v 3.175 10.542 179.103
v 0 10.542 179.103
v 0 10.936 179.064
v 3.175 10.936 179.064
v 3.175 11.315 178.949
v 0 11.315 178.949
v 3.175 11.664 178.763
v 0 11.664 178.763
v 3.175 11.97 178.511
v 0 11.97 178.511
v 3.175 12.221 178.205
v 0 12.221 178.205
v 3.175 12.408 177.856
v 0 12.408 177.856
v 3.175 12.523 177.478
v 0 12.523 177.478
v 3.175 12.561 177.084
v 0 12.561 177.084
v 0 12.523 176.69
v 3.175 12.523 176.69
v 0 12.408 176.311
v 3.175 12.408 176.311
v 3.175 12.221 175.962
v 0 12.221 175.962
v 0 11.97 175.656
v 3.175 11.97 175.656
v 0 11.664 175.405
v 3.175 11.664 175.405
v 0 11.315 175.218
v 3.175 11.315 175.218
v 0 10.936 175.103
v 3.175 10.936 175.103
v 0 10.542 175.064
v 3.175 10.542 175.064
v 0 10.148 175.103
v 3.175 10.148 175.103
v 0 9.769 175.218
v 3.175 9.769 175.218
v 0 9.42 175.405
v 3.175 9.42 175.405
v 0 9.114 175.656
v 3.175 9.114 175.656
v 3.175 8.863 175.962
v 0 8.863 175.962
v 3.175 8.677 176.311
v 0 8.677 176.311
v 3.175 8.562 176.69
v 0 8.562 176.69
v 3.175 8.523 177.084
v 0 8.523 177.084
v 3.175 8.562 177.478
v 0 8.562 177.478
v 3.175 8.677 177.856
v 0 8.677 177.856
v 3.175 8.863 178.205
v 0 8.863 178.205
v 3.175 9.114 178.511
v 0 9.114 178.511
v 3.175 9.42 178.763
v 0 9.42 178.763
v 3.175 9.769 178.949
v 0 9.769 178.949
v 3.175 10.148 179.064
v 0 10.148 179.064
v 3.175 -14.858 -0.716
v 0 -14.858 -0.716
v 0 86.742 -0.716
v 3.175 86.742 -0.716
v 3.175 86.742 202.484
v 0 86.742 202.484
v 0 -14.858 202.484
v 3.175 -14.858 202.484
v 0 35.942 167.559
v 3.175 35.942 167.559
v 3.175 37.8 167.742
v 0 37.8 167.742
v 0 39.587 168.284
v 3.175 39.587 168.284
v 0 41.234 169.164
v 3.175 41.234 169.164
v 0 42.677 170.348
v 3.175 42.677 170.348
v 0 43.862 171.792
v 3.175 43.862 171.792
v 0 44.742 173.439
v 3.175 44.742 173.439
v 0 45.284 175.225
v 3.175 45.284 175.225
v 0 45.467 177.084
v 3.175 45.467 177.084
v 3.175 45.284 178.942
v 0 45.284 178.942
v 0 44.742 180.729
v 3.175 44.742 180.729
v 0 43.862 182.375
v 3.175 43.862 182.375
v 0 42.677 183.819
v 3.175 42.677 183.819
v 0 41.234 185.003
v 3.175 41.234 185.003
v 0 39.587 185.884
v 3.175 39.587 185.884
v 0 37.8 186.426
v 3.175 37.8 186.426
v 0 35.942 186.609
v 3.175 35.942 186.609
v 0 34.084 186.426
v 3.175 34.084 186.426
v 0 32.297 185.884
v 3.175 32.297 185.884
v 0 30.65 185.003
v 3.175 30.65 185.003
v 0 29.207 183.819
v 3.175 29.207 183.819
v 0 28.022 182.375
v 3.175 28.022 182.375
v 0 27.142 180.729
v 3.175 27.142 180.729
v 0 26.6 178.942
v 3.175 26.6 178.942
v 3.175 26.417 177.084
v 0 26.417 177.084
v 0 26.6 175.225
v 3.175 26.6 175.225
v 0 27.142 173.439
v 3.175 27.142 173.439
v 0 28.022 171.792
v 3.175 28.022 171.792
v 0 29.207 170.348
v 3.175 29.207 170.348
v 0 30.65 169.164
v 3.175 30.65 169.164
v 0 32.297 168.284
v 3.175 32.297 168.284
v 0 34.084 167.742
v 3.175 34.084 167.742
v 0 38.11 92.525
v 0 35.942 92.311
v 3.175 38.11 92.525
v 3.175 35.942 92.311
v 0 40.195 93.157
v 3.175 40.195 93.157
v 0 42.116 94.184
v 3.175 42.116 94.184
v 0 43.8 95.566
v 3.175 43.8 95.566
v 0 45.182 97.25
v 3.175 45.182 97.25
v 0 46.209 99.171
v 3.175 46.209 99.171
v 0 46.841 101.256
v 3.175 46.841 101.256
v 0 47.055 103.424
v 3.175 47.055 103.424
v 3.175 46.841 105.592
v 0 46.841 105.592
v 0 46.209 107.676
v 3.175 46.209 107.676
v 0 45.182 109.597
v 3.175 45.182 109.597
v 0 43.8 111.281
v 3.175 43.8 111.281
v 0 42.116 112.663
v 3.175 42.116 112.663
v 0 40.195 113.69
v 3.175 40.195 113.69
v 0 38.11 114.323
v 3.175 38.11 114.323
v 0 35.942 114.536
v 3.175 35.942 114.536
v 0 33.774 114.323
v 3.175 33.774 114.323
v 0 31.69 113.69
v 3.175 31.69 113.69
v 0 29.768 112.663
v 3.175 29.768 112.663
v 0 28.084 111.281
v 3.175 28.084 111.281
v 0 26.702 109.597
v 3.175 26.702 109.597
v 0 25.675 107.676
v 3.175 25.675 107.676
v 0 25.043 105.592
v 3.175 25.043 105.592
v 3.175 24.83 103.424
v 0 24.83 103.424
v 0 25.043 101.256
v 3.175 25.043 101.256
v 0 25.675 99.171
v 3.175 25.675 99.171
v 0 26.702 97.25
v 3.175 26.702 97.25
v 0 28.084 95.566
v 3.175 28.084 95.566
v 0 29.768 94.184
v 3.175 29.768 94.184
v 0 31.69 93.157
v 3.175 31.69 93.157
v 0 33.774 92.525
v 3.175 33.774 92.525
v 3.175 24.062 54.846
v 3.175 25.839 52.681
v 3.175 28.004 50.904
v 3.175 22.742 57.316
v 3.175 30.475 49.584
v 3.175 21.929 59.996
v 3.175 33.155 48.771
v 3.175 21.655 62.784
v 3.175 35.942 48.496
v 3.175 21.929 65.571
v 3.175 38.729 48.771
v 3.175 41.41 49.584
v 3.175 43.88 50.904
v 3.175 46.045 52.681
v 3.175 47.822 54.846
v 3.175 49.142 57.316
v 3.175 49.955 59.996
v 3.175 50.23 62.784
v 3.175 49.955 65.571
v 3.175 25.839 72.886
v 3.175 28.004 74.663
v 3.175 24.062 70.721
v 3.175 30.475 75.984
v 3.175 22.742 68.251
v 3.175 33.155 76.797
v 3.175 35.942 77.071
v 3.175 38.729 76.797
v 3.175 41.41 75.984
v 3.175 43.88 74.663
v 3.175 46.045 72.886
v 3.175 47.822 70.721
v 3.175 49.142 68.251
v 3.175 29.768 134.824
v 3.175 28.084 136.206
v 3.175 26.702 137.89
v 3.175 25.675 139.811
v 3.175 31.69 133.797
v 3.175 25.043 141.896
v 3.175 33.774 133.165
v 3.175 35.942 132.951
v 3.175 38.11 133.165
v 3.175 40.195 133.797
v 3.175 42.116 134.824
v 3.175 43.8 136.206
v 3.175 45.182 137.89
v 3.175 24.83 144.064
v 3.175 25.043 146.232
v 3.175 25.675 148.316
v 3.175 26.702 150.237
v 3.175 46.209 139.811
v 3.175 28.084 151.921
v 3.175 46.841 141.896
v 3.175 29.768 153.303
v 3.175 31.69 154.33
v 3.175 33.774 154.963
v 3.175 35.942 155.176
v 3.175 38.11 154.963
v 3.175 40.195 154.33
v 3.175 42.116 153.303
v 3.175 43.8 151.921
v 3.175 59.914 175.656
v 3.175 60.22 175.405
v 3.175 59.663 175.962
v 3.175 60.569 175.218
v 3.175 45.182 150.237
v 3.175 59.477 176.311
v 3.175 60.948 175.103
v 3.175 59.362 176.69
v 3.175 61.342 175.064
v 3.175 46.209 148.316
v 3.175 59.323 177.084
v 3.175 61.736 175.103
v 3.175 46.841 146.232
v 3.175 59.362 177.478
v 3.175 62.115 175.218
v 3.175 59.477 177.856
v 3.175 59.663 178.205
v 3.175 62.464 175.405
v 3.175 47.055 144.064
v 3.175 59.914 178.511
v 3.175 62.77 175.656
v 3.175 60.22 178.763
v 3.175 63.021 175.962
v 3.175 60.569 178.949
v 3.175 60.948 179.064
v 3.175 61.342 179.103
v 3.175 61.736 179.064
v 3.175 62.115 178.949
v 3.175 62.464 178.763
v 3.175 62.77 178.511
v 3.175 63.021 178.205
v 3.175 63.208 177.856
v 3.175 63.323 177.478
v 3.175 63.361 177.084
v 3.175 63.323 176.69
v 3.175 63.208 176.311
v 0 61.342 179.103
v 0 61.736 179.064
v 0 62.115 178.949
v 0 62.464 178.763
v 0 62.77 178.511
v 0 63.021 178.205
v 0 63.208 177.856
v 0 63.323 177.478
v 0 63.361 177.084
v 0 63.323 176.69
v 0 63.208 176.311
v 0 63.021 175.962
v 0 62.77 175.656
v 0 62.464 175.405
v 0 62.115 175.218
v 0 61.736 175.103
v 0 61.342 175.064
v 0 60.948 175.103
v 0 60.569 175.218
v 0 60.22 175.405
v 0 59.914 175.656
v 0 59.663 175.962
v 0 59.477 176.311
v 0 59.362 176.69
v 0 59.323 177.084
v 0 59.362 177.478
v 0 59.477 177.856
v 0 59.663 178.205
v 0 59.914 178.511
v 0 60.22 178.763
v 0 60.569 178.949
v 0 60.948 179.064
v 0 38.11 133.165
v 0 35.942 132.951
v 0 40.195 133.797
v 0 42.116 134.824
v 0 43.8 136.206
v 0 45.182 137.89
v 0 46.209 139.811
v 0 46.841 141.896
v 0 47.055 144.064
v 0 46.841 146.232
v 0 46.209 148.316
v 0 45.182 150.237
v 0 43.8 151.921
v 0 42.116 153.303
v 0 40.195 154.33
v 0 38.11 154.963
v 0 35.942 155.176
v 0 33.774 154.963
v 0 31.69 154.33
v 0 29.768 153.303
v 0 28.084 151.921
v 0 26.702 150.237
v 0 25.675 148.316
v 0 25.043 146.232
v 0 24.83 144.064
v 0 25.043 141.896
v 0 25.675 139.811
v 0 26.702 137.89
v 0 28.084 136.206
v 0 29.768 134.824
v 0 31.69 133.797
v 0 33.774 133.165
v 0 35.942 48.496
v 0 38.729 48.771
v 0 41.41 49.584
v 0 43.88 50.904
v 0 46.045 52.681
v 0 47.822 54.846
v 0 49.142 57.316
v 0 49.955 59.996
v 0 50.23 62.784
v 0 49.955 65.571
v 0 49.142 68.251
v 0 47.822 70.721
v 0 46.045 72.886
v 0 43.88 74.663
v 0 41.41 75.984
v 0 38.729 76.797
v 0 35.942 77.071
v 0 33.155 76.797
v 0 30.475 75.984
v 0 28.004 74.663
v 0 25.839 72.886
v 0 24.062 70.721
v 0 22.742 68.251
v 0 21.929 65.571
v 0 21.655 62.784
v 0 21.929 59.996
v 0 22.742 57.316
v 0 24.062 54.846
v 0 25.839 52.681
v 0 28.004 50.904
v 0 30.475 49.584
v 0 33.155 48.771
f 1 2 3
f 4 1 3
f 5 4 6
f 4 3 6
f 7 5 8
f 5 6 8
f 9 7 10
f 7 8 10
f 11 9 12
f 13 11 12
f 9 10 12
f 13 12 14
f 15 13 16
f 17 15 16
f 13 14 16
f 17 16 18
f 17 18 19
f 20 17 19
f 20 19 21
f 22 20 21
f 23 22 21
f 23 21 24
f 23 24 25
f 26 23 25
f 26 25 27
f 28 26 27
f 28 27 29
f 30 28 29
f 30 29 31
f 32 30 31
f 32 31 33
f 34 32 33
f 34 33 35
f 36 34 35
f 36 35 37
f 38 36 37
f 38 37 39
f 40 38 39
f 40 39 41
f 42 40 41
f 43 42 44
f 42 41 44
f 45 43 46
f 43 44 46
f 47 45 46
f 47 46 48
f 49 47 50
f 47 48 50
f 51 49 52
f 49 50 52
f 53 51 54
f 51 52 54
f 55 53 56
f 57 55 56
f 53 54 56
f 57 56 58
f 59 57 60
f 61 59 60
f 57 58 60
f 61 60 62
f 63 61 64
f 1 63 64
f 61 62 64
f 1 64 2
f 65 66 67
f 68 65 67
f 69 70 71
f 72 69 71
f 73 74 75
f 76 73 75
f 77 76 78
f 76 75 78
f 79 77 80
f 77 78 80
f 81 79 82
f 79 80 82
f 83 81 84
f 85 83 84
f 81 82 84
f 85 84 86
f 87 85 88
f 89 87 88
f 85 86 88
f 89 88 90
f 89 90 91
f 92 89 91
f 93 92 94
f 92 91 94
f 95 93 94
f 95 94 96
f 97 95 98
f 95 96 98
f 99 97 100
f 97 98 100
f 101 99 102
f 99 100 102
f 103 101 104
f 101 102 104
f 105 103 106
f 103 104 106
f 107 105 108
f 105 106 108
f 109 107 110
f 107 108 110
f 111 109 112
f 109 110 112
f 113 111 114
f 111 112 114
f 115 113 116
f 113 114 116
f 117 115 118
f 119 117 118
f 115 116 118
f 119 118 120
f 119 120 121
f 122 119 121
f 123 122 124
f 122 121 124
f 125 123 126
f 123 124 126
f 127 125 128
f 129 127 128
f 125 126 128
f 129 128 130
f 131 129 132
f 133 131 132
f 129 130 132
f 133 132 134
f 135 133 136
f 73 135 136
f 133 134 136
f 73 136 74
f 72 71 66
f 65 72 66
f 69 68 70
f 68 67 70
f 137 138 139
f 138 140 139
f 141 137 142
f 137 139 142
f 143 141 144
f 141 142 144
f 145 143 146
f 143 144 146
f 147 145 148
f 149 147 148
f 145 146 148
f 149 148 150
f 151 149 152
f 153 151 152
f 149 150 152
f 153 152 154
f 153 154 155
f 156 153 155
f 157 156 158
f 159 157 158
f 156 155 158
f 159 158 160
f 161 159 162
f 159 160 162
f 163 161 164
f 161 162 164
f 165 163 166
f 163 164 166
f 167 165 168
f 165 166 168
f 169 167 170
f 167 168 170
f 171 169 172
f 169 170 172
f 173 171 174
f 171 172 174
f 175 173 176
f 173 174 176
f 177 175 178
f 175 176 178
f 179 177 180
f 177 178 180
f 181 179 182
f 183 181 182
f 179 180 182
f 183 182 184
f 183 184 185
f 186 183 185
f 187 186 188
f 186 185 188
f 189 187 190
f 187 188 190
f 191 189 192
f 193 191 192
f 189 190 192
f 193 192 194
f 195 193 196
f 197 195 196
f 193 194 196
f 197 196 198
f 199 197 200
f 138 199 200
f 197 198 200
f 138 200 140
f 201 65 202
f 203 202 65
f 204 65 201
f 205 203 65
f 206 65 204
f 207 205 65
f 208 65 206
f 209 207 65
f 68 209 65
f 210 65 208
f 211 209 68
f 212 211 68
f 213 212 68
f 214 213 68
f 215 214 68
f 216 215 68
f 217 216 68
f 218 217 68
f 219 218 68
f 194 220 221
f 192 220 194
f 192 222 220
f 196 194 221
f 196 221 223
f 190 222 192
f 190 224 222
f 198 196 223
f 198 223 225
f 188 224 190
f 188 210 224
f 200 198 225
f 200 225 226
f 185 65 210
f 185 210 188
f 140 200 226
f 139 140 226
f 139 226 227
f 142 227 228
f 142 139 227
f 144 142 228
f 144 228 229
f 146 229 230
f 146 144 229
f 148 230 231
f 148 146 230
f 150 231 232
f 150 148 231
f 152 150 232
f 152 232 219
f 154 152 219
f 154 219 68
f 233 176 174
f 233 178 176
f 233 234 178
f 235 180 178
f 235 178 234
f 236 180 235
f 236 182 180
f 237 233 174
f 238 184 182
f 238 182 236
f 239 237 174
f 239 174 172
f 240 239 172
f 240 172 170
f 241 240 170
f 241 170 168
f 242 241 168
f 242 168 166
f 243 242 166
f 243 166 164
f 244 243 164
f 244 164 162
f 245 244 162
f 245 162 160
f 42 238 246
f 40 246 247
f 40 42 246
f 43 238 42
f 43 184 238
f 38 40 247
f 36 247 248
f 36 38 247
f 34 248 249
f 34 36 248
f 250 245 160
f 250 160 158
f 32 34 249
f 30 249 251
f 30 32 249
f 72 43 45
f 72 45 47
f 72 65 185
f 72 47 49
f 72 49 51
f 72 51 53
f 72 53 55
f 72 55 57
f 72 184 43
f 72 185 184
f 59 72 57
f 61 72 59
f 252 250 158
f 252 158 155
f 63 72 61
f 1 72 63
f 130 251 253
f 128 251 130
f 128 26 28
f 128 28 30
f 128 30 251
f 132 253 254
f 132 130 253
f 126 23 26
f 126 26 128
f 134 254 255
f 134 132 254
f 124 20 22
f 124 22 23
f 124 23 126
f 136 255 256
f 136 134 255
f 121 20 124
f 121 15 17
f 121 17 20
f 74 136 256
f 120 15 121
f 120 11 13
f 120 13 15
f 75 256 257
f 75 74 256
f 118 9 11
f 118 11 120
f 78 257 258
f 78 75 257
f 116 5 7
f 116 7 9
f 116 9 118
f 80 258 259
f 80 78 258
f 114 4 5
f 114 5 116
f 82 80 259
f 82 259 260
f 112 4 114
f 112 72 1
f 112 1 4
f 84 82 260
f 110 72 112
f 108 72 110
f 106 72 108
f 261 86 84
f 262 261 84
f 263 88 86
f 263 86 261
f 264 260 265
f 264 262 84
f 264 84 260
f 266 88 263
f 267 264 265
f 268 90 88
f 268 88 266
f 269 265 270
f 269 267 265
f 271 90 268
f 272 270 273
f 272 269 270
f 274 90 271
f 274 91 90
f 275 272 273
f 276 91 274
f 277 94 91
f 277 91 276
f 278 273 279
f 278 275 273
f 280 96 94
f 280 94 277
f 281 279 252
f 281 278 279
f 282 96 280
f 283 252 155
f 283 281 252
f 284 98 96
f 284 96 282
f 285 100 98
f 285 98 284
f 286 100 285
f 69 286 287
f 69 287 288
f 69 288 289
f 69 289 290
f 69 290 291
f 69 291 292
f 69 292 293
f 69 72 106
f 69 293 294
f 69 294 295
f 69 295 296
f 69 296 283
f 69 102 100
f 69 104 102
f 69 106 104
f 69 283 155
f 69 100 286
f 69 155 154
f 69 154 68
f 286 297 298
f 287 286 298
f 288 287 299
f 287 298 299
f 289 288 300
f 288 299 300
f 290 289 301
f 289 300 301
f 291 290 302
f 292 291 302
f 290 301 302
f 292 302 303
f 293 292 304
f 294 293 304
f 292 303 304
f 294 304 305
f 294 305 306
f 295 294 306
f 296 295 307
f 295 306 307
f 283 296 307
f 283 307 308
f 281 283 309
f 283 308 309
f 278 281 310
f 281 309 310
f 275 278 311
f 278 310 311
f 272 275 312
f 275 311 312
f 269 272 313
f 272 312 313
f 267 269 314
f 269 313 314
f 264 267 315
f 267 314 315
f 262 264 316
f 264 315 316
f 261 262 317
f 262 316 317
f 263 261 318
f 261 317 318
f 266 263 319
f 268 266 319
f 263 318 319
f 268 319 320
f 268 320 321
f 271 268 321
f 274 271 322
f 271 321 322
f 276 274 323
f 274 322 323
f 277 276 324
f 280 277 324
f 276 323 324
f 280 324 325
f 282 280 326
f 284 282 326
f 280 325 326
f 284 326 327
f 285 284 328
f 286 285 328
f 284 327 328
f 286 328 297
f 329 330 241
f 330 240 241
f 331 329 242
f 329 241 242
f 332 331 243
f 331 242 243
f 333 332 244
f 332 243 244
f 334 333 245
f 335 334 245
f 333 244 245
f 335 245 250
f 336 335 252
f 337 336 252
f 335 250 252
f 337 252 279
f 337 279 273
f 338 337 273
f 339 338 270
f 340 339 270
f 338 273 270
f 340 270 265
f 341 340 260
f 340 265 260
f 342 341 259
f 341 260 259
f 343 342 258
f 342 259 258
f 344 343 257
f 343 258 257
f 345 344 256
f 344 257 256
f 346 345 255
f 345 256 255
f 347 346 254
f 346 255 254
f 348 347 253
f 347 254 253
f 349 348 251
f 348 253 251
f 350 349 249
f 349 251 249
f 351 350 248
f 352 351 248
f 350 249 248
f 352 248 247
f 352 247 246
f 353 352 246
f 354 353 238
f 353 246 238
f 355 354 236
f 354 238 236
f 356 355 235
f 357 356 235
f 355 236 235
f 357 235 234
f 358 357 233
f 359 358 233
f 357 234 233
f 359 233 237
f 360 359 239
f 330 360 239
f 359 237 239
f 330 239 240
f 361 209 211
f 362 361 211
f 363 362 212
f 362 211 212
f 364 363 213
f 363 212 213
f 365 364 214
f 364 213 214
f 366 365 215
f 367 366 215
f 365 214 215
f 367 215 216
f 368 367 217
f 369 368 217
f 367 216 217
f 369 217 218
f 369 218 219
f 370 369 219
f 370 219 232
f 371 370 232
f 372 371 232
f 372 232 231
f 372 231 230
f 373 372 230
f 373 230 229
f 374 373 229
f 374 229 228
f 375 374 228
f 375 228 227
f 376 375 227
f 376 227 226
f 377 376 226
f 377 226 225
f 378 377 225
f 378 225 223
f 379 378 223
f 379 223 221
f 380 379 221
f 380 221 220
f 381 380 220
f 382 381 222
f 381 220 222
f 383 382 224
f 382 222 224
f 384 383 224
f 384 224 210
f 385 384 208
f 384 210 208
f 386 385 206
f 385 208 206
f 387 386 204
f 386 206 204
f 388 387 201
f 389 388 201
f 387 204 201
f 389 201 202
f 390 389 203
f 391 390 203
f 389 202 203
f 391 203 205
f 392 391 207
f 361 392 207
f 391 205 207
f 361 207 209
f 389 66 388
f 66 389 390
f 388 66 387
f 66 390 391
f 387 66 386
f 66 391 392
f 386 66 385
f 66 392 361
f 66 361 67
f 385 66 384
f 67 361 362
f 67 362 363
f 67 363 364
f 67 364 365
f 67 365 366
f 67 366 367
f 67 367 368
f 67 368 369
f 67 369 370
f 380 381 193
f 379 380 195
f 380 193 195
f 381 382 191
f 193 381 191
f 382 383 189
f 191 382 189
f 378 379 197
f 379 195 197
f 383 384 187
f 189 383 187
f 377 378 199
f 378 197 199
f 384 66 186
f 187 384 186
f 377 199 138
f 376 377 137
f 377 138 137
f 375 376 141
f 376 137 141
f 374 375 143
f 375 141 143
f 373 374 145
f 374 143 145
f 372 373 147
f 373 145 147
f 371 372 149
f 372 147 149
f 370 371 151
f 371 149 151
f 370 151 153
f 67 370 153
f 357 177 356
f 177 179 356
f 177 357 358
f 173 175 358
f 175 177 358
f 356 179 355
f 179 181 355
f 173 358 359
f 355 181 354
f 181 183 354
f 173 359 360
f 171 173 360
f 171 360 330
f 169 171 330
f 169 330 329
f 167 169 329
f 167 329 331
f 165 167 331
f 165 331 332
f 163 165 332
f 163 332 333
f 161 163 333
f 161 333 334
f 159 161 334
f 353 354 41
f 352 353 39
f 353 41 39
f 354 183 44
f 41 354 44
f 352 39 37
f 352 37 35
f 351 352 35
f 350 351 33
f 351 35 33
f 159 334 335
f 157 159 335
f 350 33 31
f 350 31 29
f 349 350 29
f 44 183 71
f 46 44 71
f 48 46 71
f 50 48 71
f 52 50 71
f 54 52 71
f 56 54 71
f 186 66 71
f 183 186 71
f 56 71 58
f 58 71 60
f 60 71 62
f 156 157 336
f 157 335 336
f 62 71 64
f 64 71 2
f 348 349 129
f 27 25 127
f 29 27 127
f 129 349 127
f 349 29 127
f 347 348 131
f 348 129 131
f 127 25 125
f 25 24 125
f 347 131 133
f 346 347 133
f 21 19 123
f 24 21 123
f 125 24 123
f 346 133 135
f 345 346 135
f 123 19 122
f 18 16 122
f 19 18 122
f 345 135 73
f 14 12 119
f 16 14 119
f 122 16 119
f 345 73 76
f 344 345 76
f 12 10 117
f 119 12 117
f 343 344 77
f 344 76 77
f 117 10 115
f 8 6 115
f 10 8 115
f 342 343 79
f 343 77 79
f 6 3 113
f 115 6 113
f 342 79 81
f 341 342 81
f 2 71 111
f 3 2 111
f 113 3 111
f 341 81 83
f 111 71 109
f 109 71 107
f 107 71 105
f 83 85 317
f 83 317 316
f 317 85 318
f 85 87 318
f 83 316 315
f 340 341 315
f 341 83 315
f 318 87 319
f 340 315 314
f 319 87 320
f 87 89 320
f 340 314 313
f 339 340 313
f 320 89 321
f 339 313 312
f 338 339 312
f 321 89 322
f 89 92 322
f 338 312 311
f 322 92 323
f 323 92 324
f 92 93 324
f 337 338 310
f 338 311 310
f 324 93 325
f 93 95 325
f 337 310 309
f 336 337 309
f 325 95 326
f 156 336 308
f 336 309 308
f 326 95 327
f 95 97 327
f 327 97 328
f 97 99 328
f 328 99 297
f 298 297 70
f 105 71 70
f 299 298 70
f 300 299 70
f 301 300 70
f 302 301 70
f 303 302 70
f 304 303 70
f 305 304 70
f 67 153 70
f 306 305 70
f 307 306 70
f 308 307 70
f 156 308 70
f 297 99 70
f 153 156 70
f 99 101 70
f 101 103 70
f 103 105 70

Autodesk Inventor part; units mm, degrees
ref_plane "YZ Plane" through (0, 0, 0) normal (1, 0, 0) x (0, 1, 0)
ref_plane "XZ Plane" through (0, 0, 0) normal (0, 1, 0) x (-1, 0, 0)
ref_plane "XY Plane" through (0, 0, 0) normal (0, 0, 1) x (1, 0, 0)
sketch "Sketch1" plane through (0, 0, 0) normal (1, 0, 0) x (0, 1, 0)
  line L0 (86.7421, 202.4836) -> (-14.8579, 202.4836)
  line L1 (-14.8579, 202.4836) -> (-14.8579, -0.7164)
  line L2 (-14.8579, -0.7164) -> (86.7421, -0.7164)
  line L3 (86.7421, -0.7164) -> (86.7421, 202.4836)
  point P0 (0, 0)
  dimension "d0" = 101.6
  dimension "d1" = 203.2
extrude "Extrusion1" add sketch "Sketch1" along normal blind 3.175
sketch "Sketch2" plane through (3.175, 0, 0) normal (1, 0, 0) x (0, 0, -1)
  line L0 (-202.4836, 86.7421) -> (-202.4836, -14.8579) construction
  line L1 (-202.4836, 35.9421) -> (-177.0836, 35.9421) construction
  line L2 (-177.0836, 35.9421) -> (-144.0636, 35.9421) construction
  circle A0 centre (-144.0636, 35.9421) radius 11.1125
  line L3 (-144.0636, 35.9421) -> (-103.4236, 35.9421) construction
  line L4 (-103.4236, 35.9421) -> (-62.7836, 35.9421) construction
  circle A1 centre (-103.4236, 35.9421) radius 11.1125
  circle A2 centre (-62.7836, 35.9421) radius 14.2875
  circle A3 centre (-177.0836, 35.9421) radius 9.525
  point P0 (0, 0)
  dimension "d4" = 25.4
  dimension "d5" = 33.02
  dimension "d7" = 22.225
  dimension "d8" = 40.64
  dimension "d9" = 40.64
  dimension "d10" = 22.225
  dimension "d11" = 28.575
  dimension "d14" = 19.05
extrude "Extrusion2" cut sketch "Sketch2" against normal blind 12.7
sketch "Sketch3" plane through (0, 0, 0) normal (-1, 0, 0) x (0, 0, 1)
  circle A0 centre (177.0836, 35.9421) radius 9.525 projected
  circle A1 centre (177.0836, 61.3421) radius 2.0193
  circle A2 centre (177.0836, 10.5421) radius 2.0193
  line L0 (177.0836, 61.3421) -> (177.0836, 10.5421) construction
  point P0 (0, 0)
  dimension "d17" = 4.0386
  dimension "d18" = 4.0386
extrude "Extrusion3" cut sketch "Sketch3" against normal blind 25.4 contours A1 | A2
properties part number "ARm Gearbox Plate"
